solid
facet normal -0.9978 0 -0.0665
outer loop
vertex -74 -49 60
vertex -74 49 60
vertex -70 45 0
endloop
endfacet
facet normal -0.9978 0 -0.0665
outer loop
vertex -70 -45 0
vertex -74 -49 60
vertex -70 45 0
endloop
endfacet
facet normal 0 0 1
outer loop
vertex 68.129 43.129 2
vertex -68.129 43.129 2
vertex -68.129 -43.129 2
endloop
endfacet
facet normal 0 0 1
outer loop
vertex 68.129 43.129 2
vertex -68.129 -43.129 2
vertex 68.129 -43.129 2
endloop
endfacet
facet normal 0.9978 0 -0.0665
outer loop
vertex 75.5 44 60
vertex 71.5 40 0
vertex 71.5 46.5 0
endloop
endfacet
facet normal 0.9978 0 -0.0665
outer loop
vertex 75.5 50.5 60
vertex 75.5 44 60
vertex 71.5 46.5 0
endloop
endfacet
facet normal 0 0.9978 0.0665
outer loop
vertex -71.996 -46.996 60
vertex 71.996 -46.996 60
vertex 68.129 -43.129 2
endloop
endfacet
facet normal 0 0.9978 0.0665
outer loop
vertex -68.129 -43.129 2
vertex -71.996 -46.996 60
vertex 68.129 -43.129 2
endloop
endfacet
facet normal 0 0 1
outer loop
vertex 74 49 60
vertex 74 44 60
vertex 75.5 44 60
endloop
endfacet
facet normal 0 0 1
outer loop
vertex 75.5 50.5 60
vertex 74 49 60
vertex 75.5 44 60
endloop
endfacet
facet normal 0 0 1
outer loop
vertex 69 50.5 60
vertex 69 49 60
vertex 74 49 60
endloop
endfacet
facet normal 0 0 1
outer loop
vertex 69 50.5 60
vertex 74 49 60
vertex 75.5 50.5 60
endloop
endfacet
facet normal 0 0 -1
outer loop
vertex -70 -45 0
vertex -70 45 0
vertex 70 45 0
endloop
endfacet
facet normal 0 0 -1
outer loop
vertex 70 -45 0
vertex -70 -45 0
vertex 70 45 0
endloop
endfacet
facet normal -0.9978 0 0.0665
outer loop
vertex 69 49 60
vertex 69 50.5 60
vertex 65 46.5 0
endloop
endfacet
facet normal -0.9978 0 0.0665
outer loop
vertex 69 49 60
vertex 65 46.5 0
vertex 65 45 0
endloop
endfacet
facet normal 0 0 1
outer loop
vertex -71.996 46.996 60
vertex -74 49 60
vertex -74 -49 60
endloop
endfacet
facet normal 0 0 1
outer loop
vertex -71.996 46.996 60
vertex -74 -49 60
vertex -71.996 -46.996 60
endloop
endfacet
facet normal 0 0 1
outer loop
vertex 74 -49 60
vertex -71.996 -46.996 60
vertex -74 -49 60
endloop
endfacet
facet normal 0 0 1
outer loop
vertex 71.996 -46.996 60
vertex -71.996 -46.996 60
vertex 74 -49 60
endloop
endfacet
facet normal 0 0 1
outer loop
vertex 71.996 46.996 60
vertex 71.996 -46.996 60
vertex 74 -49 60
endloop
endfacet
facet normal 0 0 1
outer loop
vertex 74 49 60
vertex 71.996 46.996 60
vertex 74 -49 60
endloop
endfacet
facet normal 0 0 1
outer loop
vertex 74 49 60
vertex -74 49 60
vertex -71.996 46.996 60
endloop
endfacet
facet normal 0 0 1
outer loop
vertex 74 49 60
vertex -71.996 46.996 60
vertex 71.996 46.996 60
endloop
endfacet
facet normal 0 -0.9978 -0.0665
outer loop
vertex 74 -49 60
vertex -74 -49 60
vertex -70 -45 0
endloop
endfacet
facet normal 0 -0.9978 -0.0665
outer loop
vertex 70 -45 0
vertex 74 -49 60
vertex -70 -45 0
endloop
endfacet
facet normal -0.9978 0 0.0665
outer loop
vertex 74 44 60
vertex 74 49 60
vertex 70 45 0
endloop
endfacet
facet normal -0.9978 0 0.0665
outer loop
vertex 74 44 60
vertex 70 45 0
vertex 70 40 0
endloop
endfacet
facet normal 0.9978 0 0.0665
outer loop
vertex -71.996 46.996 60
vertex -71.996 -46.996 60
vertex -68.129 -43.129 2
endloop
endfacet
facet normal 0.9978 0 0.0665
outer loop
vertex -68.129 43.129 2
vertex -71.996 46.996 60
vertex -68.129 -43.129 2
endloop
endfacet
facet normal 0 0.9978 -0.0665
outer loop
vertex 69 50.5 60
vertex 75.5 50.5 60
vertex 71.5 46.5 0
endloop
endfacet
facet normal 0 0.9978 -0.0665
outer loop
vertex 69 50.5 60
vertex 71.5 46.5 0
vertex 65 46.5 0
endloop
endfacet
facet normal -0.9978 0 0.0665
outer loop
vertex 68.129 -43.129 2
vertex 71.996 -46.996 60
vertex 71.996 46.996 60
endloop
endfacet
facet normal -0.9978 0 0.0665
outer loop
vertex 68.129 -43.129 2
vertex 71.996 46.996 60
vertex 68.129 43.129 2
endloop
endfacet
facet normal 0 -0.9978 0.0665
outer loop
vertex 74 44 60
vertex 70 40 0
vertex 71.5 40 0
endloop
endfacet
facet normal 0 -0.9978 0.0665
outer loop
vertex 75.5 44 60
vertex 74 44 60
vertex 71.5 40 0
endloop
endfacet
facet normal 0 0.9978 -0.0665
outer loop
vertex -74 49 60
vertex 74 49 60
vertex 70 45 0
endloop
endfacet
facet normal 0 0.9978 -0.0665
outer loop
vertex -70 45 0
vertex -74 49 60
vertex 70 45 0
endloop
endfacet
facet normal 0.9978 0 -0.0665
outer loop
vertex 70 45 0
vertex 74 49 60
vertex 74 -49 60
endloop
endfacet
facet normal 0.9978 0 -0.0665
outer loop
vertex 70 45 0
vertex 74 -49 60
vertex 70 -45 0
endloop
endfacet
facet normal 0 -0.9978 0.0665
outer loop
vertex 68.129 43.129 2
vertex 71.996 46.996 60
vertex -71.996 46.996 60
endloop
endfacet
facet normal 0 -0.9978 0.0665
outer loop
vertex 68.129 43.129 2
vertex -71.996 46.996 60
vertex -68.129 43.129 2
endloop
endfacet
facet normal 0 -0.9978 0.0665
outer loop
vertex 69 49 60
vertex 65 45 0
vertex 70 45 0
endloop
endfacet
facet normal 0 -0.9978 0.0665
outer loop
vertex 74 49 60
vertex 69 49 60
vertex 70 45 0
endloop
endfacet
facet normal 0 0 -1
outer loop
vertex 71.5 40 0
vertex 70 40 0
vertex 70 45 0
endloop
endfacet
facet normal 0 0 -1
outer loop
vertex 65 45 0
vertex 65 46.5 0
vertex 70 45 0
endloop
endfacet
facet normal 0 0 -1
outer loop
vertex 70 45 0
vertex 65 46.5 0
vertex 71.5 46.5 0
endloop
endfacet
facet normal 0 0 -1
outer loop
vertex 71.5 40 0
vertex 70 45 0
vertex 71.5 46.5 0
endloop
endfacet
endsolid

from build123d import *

# Parameters (mm, degrees)
F0_W        = 150
F0_H        = 100
F1_DEPTH    = 60
F2_T1_DEPTH = 539.968053853
F2_T3_DEPTH = 489.968053853
F3_T        = -2


# Not quite as in the source:
# - a fillet or chamfer that OpenCascade refuses, or shapes differently, is made with other operations: its cross-section is extruded or revolved along the edge and cut away or added


with BuildPart() as f1:
    # F0 (on Top) → F1 (new body)
    with BuildSketch(Plane.XY):
        Rectangle(F0_W, F0_H)
    extrude(amount=F1_DEPTH)

    # F2: chamfer of 5 x 75 on 4 edges, made by hand

    # F2_s2 → F2_t1 (cut)
    with BuildSketch(Plane.YZ.offset(-269.9840269265)):
        Polygon((-50, 75), (-45, 0), (-50, 0), align=None)
        Polygon((50, 75), (45, 0), (50, 0), align=None)
    extrude(amount=F2_T1_DEPTH, mode=Mode.SUBTRACT)

    # F2_s4 → F2_t3 (cut)
    with BuildSketch(Plane.XZ.offset(-244.9840269265)):
        Polygon((75, 75), (70, 0), (75, 0), align=None)
        Polygon((-75, 75), (-70, 0), (-75, 0), align=None)
    extrude(amount=F2_T3_DEPTH, mode=Mode.SUBTRACT)

    # F3
    f3_openings = [f1.faces().sort_by_distance(p)[0] for p in [
        (0, 0, 60),
    ]]
    offset(amount=F3_T, openings=f3_openings)


with BuildPart() as f5:
    # F5: sweep along a path in F5_path
    with BuildLine(Plane(origin=(70, 45, 0), x_dir=(0, -0.0665190105, -0.9977851579), z_dir=(0, 0.9977851579, -0.0665190105))) as f5_path:
        Line((0, 0), (-60.1331855135, -4))
    # F4 (on face) → F5 (sweep)
    with BuildSketch(Plane.XY.offset(60)):
        Polygon((69, 49), (74, 49), (74, 44), (75.5, 44), (75.5, 50.5), (69, 50.5), align=None)
    sweep(path=f5_path.line)


solid = Compound([f1.part, f5.part])
